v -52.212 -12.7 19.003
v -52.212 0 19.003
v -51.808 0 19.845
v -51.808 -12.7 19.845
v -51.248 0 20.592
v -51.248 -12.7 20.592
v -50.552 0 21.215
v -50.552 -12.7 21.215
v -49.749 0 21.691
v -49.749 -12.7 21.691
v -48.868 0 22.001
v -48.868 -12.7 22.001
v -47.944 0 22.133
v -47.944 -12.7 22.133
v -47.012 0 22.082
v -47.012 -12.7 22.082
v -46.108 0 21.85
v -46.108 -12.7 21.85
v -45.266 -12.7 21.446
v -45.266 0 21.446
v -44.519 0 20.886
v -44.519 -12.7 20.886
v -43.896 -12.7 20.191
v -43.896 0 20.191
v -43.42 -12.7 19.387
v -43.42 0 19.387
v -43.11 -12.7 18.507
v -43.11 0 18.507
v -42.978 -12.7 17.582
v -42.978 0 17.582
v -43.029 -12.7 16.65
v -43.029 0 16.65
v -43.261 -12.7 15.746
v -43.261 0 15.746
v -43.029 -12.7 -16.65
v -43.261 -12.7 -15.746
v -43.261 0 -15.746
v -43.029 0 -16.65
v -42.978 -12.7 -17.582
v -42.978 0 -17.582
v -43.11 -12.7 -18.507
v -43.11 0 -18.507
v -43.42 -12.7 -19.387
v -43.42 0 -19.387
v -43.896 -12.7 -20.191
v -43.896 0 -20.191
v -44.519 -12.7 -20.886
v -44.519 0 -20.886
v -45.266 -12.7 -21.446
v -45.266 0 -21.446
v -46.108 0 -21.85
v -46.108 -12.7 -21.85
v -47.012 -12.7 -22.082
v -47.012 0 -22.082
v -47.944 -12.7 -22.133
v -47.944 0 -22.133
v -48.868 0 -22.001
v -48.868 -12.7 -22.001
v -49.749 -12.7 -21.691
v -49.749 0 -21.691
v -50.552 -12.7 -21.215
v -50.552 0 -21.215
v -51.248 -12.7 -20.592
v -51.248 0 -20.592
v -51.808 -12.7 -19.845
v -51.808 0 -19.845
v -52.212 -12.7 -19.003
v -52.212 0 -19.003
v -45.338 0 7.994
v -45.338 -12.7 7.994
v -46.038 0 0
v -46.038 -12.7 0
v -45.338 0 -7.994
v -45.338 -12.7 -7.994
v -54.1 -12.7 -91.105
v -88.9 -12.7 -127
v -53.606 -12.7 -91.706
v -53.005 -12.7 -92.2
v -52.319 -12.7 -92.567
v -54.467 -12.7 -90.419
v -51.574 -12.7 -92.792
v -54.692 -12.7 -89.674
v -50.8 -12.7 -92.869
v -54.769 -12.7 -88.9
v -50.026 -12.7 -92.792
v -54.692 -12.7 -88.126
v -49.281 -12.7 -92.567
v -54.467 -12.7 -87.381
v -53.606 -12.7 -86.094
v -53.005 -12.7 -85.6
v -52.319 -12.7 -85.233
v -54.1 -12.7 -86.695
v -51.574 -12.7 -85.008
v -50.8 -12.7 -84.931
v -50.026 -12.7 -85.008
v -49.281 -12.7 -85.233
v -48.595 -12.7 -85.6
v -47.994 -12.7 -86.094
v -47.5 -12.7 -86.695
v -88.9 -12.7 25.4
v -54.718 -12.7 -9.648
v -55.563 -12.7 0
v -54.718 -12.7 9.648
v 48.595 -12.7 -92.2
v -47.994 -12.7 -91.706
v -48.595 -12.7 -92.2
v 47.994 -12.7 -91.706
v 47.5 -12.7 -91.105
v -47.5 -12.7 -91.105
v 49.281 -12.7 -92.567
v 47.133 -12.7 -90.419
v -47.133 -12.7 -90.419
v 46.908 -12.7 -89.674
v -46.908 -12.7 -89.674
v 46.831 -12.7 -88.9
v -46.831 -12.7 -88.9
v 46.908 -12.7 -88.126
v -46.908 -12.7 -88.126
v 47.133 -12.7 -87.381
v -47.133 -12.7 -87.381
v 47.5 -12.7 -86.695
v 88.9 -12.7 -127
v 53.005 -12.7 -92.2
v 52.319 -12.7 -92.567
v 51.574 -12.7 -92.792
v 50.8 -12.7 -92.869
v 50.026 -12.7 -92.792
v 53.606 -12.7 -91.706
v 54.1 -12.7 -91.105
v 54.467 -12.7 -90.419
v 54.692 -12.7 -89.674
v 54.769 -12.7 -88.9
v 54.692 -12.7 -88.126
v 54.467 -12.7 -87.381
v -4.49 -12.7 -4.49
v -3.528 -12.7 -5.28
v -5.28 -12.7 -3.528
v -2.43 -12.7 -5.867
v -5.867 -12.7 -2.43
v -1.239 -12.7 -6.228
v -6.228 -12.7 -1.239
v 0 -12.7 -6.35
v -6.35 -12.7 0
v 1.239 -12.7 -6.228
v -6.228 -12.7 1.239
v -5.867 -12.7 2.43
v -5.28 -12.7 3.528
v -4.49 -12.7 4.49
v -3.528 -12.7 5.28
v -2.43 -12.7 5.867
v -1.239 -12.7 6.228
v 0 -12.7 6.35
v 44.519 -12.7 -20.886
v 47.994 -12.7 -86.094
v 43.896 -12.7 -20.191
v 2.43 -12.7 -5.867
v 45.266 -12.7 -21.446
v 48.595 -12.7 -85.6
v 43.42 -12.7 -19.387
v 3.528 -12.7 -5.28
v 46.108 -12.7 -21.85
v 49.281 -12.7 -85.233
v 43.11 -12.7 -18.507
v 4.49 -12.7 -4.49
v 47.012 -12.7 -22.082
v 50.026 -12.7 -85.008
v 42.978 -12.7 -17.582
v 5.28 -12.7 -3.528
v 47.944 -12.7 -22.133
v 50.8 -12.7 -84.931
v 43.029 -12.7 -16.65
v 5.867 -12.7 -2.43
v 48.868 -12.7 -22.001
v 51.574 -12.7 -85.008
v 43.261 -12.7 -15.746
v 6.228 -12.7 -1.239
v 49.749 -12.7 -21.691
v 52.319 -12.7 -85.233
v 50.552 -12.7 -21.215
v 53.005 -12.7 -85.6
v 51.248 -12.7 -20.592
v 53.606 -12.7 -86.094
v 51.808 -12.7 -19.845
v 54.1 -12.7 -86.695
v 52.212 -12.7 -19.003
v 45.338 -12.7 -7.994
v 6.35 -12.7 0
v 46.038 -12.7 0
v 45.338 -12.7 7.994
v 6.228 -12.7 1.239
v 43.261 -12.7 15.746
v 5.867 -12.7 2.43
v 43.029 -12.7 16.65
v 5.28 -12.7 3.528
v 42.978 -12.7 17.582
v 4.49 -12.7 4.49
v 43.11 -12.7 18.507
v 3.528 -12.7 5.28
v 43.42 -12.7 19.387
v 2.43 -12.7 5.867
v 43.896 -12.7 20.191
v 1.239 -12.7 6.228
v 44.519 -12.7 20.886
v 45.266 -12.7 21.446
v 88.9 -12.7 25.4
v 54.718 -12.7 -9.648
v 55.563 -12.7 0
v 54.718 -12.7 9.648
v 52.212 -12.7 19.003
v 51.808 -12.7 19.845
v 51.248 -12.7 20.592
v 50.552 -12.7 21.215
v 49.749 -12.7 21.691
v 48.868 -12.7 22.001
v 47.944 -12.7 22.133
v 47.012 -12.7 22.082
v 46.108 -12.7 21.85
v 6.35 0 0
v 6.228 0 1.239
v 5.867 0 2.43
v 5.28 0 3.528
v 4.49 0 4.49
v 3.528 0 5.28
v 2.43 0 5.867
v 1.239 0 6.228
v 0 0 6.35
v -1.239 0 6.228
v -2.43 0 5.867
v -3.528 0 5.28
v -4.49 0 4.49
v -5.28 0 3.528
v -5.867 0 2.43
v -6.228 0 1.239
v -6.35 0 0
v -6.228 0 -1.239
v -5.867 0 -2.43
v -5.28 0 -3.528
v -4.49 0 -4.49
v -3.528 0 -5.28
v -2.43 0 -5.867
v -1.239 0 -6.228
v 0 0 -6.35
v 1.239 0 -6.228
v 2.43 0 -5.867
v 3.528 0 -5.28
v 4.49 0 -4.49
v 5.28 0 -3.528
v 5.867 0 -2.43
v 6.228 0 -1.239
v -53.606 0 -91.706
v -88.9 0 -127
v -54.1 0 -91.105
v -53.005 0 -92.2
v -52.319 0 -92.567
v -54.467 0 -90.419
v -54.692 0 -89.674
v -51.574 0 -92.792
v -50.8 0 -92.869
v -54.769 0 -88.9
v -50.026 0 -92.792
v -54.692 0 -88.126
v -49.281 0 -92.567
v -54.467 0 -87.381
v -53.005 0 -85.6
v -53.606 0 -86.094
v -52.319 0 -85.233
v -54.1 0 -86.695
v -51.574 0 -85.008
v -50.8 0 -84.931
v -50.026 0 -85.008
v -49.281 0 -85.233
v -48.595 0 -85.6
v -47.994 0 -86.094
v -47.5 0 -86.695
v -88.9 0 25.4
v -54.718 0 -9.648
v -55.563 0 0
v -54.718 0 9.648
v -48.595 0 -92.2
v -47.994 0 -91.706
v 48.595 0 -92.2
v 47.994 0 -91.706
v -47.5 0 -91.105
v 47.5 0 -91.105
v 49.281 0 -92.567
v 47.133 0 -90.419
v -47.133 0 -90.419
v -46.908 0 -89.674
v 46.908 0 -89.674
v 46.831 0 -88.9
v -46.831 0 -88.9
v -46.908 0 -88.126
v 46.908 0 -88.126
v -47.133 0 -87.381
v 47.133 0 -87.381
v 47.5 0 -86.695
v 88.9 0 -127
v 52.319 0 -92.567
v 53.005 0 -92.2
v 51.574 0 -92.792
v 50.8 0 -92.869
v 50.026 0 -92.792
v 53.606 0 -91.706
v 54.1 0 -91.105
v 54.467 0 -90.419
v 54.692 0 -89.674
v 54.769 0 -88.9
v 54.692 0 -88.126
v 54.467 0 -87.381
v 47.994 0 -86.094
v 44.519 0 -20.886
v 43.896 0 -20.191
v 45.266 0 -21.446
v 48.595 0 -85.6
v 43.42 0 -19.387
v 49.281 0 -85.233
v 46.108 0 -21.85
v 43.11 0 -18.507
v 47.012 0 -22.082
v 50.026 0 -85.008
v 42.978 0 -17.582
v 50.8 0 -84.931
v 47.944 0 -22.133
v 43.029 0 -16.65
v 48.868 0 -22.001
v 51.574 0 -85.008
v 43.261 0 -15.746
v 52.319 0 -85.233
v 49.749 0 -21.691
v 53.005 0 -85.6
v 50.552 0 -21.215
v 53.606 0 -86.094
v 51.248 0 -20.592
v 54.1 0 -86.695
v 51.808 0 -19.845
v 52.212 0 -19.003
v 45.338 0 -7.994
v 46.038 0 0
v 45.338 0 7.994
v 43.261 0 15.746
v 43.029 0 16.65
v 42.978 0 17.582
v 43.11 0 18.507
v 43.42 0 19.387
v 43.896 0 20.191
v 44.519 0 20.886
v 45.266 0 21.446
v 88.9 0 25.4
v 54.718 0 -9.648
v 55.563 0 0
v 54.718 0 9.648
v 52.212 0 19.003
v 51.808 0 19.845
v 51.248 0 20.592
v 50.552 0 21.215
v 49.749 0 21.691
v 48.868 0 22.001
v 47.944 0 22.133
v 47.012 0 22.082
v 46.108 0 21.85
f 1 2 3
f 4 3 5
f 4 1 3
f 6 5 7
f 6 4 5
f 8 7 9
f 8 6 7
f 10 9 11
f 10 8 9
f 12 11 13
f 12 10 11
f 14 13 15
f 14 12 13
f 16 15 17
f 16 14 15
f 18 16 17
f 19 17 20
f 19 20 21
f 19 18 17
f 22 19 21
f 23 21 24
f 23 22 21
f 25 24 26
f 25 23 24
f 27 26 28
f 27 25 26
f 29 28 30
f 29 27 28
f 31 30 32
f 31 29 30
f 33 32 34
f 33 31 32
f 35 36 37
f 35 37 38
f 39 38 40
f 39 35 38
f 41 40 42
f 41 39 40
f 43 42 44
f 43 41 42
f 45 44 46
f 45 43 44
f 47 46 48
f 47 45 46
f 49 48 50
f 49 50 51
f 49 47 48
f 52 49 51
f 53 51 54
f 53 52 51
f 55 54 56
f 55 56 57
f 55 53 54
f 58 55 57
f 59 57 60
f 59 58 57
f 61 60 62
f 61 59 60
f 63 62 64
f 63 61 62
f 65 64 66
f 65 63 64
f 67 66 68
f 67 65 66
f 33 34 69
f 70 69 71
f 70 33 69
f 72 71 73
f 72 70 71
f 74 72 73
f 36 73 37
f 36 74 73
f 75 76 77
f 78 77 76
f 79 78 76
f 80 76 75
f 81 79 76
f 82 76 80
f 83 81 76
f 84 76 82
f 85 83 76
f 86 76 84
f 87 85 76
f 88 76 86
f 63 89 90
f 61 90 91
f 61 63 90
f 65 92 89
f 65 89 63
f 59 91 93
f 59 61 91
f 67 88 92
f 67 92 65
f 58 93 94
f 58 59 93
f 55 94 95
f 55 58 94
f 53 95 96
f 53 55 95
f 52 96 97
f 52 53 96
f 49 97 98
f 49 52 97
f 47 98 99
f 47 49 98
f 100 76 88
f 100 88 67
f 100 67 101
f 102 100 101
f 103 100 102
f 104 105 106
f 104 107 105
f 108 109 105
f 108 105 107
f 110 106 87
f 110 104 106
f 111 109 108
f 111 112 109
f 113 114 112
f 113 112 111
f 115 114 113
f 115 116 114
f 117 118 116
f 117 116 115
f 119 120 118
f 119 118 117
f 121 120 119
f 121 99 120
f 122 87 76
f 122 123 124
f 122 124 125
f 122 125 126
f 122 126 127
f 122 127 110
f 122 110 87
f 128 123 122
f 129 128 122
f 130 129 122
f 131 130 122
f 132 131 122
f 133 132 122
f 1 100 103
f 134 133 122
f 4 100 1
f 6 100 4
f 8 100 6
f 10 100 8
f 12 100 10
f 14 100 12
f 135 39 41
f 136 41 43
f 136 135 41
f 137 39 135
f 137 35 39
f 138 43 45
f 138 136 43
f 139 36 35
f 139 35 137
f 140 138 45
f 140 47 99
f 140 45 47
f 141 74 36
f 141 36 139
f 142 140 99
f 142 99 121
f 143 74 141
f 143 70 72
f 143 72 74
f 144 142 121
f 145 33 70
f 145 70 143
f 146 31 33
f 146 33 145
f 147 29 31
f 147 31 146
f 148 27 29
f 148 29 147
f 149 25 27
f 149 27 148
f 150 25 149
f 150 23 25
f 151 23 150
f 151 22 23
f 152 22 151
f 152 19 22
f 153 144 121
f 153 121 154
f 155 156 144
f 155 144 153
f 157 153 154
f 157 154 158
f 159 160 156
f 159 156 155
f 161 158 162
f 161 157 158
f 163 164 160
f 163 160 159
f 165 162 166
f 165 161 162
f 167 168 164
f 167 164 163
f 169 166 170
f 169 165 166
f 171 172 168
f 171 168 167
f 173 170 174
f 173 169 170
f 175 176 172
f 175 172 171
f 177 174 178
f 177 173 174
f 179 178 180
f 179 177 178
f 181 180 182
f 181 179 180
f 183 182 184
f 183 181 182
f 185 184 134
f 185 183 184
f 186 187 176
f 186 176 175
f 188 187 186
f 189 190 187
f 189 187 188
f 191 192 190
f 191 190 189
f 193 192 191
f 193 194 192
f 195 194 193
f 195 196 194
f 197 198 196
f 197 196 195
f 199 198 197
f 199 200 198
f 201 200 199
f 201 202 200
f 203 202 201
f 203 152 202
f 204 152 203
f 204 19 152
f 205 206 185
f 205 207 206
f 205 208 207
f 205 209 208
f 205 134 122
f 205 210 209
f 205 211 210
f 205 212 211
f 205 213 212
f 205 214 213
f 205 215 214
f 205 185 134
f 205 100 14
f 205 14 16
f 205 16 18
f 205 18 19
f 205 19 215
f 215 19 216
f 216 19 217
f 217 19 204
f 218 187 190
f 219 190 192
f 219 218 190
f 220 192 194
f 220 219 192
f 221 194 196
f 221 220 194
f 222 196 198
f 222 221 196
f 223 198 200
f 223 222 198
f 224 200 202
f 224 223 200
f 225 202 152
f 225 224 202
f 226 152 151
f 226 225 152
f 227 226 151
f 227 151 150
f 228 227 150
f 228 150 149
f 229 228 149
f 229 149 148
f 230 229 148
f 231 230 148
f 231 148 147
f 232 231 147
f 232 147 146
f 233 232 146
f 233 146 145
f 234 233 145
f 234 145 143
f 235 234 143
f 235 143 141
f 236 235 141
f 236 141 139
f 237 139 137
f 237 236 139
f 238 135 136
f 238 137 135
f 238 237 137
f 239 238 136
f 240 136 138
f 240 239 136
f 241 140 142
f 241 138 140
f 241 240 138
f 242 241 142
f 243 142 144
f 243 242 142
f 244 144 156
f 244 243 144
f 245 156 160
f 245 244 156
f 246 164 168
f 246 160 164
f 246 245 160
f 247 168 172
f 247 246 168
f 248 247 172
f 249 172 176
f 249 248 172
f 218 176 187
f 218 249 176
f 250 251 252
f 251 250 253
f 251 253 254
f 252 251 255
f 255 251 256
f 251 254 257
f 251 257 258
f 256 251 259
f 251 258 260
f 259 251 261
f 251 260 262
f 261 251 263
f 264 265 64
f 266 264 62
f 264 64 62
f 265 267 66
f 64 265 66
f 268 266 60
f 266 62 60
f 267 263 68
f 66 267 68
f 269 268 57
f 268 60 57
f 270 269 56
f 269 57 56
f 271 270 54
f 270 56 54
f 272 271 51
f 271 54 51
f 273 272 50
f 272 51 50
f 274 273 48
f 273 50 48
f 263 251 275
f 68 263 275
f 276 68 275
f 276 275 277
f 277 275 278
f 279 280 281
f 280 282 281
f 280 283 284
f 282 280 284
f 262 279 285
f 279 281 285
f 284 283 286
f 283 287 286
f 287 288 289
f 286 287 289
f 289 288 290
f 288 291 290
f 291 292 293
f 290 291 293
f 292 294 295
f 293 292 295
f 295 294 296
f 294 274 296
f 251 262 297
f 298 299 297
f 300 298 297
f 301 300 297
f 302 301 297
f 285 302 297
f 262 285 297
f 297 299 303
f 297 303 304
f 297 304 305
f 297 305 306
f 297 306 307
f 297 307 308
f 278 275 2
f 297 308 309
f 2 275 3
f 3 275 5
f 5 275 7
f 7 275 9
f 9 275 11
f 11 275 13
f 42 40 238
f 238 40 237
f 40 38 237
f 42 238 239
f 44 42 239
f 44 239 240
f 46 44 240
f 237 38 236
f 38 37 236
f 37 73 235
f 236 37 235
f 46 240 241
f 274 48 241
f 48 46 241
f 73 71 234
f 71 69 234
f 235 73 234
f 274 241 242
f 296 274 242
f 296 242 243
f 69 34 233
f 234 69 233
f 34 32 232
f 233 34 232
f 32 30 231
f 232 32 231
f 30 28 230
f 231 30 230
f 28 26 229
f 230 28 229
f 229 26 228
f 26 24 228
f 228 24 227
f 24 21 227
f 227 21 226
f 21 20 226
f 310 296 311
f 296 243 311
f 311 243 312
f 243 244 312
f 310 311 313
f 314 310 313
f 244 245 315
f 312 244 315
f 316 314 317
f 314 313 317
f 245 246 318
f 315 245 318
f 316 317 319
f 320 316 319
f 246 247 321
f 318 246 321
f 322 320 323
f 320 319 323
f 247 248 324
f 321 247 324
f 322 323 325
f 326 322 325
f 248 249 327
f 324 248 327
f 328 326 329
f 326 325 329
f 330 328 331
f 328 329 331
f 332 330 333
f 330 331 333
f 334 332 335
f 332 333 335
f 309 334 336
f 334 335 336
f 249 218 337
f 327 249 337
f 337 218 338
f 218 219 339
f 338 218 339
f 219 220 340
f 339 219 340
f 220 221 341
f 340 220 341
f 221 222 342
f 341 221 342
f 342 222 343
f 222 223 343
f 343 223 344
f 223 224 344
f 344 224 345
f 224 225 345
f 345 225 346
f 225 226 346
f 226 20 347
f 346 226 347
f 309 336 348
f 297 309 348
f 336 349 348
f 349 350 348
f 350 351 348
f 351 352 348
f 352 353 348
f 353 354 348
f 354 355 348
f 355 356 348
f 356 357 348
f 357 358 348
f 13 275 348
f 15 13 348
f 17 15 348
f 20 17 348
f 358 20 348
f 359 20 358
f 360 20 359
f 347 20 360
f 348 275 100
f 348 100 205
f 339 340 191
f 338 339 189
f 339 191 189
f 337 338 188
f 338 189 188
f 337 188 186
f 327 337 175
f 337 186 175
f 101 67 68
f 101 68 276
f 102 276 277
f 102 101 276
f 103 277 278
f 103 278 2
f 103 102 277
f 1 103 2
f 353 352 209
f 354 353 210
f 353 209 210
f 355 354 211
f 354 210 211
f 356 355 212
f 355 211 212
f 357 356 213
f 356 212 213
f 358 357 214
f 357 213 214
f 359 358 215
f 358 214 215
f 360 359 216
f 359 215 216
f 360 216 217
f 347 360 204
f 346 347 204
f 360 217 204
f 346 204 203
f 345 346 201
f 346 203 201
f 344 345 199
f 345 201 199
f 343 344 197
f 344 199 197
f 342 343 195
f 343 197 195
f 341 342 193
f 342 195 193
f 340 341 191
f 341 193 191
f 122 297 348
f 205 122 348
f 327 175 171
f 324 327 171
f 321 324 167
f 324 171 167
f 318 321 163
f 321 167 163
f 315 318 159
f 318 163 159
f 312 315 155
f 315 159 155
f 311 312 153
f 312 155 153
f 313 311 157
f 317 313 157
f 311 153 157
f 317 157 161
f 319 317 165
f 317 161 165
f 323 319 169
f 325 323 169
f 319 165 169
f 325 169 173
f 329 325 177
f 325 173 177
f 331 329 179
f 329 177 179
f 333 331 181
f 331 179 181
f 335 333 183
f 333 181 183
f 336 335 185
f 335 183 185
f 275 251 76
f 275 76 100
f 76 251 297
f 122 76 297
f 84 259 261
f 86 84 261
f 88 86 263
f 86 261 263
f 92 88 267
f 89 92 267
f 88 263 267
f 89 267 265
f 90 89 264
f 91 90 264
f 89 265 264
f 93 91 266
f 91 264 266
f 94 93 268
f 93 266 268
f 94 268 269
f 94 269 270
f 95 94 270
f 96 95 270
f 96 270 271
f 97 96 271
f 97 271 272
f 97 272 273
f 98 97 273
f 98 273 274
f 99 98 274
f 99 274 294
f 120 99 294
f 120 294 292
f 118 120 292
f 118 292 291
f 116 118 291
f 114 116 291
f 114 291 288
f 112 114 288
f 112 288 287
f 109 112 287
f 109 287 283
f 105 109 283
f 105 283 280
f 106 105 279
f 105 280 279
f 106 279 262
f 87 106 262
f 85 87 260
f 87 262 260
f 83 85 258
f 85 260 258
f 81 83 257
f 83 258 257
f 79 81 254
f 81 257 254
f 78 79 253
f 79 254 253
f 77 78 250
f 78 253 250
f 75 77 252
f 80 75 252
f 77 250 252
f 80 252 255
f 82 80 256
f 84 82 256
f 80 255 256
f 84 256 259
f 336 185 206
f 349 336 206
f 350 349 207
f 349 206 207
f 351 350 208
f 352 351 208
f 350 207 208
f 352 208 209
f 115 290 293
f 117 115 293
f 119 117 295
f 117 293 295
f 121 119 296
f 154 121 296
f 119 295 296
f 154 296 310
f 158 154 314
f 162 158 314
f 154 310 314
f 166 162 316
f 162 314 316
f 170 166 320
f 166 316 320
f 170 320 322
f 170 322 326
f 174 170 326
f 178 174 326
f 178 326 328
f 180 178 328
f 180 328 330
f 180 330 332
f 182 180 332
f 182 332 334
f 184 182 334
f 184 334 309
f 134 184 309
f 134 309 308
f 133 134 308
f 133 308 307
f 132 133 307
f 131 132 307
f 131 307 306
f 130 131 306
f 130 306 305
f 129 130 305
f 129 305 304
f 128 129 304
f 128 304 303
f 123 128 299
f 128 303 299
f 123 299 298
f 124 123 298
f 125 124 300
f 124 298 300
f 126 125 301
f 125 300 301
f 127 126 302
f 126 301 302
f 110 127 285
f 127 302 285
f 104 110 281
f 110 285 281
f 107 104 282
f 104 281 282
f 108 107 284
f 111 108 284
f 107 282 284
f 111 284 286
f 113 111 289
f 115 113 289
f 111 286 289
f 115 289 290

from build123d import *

# Parameters (mm, degrees)
F0_W     = 184.15
F0_H     = 152.4
F0_R     = 6.35
F1_DEPTH = 12.7
F3_DEPTH = 12.701
F6_D     = 7.9375


with BuildPart() as f1:
    # F0 (on Front) → F1 (new body)
    with BuildSketch(Plane.XZ):
        with Locations((-3.175, -50.8)):
            Rectangle(F0_W, F0_H)
        Circle(F0_R, mode=Mode.SUBTRACT)
    extrude(amount=F1_DEPTH)

    # F2 (on face) → F3 (cut, through all)
    with BuildSketch(Plane.XZ.offset(12.7)):
        with BuildLine():
            ThreePointArc((52.211671, -19.003494), (55.5625, 0), (52.211671, 19.003494))
            ThreePointArc((52.211671, 19.003494), (46.107514, 21.849909), (43.261099, 15.745752))
            ThreePointArc((43.261099, 15.745752), (46.0375, 0), (43.261099, -15.745752))
            ThreePointArc((43.261099, -15.745752), (46.107514, -21.849909), (52.211671, -19.003494))
        make_face()
    extrude(amount=-F3_DEPTH, mode=Mode.SUBTRACT)

    # F4: F1 across plane


with BuildPart() as f1_1:
    add(f1.part)
    add(f1.part.mirror(Plane.YZ), mode=Mode.INTERSECT)

    # F6 (through all)
    with Locations(Plane.XZ.offset(12.7)):
        with Locations((50.8, -88.9), (-50.8, -88.9)):
            Hole(F6_D / 2)


solid = f1_1.part
